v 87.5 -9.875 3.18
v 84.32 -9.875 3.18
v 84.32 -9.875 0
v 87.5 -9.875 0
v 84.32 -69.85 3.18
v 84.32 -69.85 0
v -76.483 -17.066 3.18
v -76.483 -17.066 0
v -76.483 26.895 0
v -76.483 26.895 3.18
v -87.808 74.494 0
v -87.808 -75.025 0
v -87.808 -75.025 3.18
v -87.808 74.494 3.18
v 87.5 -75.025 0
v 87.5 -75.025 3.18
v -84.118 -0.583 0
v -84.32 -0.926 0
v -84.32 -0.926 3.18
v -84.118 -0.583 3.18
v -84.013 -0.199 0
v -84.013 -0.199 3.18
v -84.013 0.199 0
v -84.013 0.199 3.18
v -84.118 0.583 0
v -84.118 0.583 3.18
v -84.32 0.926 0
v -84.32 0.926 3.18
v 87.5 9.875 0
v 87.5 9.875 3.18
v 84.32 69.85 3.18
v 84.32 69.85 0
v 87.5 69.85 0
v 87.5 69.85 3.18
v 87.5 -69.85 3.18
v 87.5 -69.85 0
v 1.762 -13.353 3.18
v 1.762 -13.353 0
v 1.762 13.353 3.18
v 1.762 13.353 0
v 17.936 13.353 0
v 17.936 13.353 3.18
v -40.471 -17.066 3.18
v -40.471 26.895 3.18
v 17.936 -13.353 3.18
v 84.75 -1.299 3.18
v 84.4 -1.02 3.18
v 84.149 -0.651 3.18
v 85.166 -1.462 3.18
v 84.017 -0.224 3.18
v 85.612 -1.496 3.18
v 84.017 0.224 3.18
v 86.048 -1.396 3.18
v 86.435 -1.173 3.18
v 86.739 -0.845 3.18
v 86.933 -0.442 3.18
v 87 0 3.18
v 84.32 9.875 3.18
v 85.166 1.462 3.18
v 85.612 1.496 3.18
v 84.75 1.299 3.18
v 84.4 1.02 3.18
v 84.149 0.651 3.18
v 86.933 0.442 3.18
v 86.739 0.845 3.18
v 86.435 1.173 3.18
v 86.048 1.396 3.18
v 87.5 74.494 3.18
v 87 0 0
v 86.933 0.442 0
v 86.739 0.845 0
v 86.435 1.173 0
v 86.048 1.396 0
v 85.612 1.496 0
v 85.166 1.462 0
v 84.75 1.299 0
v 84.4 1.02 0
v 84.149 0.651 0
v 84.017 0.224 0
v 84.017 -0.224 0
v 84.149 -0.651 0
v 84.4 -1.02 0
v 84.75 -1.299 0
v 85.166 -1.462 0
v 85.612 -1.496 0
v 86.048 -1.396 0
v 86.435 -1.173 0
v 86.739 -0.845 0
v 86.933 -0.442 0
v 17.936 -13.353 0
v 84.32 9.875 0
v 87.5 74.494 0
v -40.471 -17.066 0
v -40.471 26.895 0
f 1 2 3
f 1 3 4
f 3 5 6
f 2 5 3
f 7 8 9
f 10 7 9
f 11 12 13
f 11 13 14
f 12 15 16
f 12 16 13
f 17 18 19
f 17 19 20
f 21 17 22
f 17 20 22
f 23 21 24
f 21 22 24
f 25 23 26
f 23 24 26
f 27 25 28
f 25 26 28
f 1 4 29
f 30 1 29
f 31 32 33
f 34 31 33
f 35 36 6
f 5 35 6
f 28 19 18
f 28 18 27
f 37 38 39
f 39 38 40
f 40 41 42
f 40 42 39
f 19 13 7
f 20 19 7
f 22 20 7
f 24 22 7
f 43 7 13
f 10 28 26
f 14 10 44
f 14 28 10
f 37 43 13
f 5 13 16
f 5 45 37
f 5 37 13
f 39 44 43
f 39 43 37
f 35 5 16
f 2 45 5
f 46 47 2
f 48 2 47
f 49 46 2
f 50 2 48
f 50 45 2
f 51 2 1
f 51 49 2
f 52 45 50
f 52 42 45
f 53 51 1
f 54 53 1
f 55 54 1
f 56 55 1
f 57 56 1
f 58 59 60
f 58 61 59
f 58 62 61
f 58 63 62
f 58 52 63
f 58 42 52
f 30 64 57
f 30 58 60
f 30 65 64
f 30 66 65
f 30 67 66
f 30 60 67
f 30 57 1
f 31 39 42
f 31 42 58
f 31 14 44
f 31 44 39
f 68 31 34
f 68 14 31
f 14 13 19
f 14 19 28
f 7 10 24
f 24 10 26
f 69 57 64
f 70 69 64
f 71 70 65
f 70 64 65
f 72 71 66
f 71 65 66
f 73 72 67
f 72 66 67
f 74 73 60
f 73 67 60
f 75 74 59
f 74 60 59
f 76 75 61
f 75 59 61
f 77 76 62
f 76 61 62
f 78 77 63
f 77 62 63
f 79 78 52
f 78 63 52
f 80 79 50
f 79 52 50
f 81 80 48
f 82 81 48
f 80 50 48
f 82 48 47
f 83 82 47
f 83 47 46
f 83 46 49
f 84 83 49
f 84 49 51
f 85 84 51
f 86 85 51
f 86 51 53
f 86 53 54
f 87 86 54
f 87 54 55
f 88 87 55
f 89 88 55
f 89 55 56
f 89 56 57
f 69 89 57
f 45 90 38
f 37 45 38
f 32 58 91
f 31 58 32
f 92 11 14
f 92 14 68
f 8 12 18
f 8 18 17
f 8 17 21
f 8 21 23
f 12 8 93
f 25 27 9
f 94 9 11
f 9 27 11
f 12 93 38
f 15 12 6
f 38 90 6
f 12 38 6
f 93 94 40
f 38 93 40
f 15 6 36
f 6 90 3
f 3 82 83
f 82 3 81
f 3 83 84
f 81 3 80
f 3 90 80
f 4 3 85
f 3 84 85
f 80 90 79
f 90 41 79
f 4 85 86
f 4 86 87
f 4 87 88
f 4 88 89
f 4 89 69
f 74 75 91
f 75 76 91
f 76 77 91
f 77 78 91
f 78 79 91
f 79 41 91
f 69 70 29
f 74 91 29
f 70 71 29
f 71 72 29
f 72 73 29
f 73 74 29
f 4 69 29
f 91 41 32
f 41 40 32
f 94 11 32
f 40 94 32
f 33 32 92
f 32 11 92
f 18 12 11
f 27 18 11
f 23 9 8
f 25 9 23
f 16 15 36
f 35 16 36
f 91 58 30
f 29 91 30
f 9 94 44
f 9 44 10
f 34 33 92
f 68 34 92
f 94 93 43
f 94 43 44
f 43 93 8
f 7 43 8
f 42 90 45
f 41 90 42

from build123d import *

# Parameters (mm, degrees)
SKETCH1_W           = 175
SKETCH1_H           = 139.7
BOSS_EXTRUDE1_DEPTH = 3.18
SKETCH2_R           = 1.5
SKETCH2_W           = 3.18
SKETCH2_H           = 59.975
CUT_EXTRUDE1_DEPTH  = 4.18
SKETCH3_R           = 1.59
CUT_EXTRUDE2_DEPTH  = 4.18
SKETCH4_R           = 1.59
CUT_EXTRUDE3_DEPTH  = 4.18
SKETCH5_W           = 91.926224914
SKETCH5_H           = 123.656630911
BOSS_EXTRUDE2_DEPTH = 3.18
SKETCH6_W           = 3.18
SKETCH6_H           = 19.75
CUT_EXTRUDE4_DEPTH  = 4.18
SKETCH8_W           = 25.560381265
SKETCH8_H           = 19.67928192
BOSS_EXTRUDE3_DEPTH = 3.18
SKETCH10_W          = 20
SKETCH10_H          = 2.468001363
BOSS_EXTRUDE4_DEPTH = 3.18
CUT_EXTRUDE5_DEPTH  = 4.18
SKETCH12_W          = 36.012104279
SKETCH12_H          = 43.960205632
CUT_EXTRUDE6_DEPTH  = 4.18
SKETCH13_W          = 16.174082381
SKETCH13_H          = 26.705141904
CUT_EXTRUDE7_DEPTH  = 4.18
SKETCH16_W          = 18.884338216
SKETCH16_H          = 121.056150973
SKETCH16_W_2        = 10.857087527
SKETCH16_H_2        = 35.437593219
SKETCH16_W_3        = 28.428801023
SKETCH16_H_3        = 14.001351757
SKETCH16_W_4        = 22.576937907
SKETCH16_H_4        = 16.729537969
BOSS_EXTRUDE6_DEPTH = 3.18
BOSS_EXTRUDE7_DEPTH = 3.18


with BuildPart() as part:
    # Sketch1 → Boss-Extrude1 (new body)
    with BuildSketch(Plane.XY):
        Rectangle(SKETCH1_W, SKETCH1_H)
    extrude(amount=BOSS_EXTRUDE1_DEPTH)

    # Sketch2 → Cut-Extrude1 (cut, through all)
    with BuildSketch(Plane.XY.offset(3.18)):
        with Locations((-85.5, 0)):
            Circle(SKETCH2_R)
        with Locations((85.5, 0)):
            Circle(SKETCH2_R)
        Polygon((-10, 69.85), (10, 69.85), (10, 66.67), (1.5, 66.67), (1.5, 62.67), (3.5, 62.67), (3.5, 59.67), (1.5, 59.67), (1.5, 56.67), (-1.5, 56.67), (-1.5, 59.67), (-3.5, 59.67), (-3.5, 62.67), (-1.5, 62.67), (-1.5, 66.67), (-10, 66.67), align=None)
        Polygon((-10, -69.85), (-10, -66.67), (-1.5, -66.67), (-1.5, -62.67), (-3.5, -62.67), (-3.5, -59.67), (-1.5, -59.67), (-1.5, -56.67), (1.5, -56.67), (1.5, -59.67), (3.5, -59.67), (3.5, -62.67), (1.5, -62.67), (1.5, -66.67), (10, -66.67), (10, -69.85), align=None)
        with Locations((-85.91, 39.8625)):
            Rectangle(SKETCH2_W, SKETCH2_H)
        with Locations((-85.91, -39.8625)):
            Rectangle(SKETCH2_W, SKETCH2_H)
        with Locations((85.91, -39.8625)):
            Rectangle(SKETCH2_W, SKETCH2_H)
        with Locations((85.91, 39.8625)):
            Rectangle(SKETCH2_W, SKETCH2_H)
        Polygon((-28.854904074, -66.67), (-20.334061159, -66.67), (-20.334061159, -69.85), (-40.334061159, -69.85), (-40.334061159, -66.67), (-31.854904074, -66.67), (-31.854904074, -62.67), (-33.77295002, -62.67), (-33.77295002, -59.67), (-31.854904074, -59.67), (-31.854904074, -56.85), (-28.854904074, -56.85), (-28.854904074, -59.67), (-26.77295002, -59.67), (-26.77295002, -62.67), (-28.854904074, -62.67), align=None)
    extrude(amount=-CUT_EXTRUDE1_DEPTH, mode=Mode.SUBTRACT)

    # Sketch3 → Cut-Extrude2 (cut, through all)
    with BuildSketch(Plane(origin=(0, 0, 0), x_dir=(-1, 0, 0), z_dir=(0, 0, -1))):
        with Locations((-35.67127699, -47.963396943)):
            Circle(SKETCH3_R)
        with Locations((-35.67127699, -30.777287406)):
            Circle(SKETCH3_R)
    extrude(amount=-CUT_EXTRUDE2_DEPTH, mode=Mode.SUBTRACT)

    # Sketch4 → Cut-Extrude3 (cut, through all)
    with BuildSketch(Plane(origin=(0, 0, 0), x_dir=(-1, 0, 0), z_dir=(0, 0, -1))):
        with Locations((-34.750723073, 53.780323187)):
            Circle(SKETCH4_R)
        with Locations((-34.750723073, 36.59421365)):
            Circle(SKETCH4_R)
        with Locations((36.249784221, 53.780323187)):
            Circle(SKETCH4_R)
        with Locations((36.249784221, 36.59421365)):
            Circle(SKETCH4_R)
        with Locations((35.983928162, -30.777287406)):
            Circle(SKETCH4_R)
        with Locations((35.983928162, -47.963396943)):
            Circle(SKETCH4_R)
        with Locations((-35.67127699, -30.777287406)):
            Circle(SKETCH4_R)
        with Locations((-35.67127699, -47.963396943)):
            Circle(SKETCH4_R)
    extrude(amount=-CUT_EXTRUDE3_DEPTH, mode=Mode.SUBTRACT)

    # Sketch5 → Boss-Extrude2 (add)
    with BuildSketch(Plane.XY.offset(3.18)):
        with Locations((-0.563564665, 5.553683182)):
            Rectangle(SKETCH5_W, SKETCH5_H)
    extrude(amount=-BOSS_EXTRUDE2_DEPTH)

    # Sketch6 → Cut-Extrude4 (cut, through all)
    with BuildSketch(Plane(origin=(0, 0, 0), x_dir=(-1, 0, 0), z_dir=(0, 0, -1))):
        with Locations((-25.21, 0.03599429)):
            Rectangle(SKETCH6_W, SKETCH6_H)
        with Locations((13.073612417, 0)):
            Rectangle(SKETCH6_W, SKETCH6_H)
    extrude(amount=-CUT_EXTRUDE4_DEPTH, mode=Mode.SUBTRACT)

    # Sketch8 → Boss-Extrude3 (add)
    with BuildSketch(Plane(origin=(0, 0, 0), x_dir=(-1, 0, 0), z_dir=(0, 0, -1))):
        with Locations((-2.780190633, -60.01035904)):
            Rectangle(SKETCH8_W, SKETCH8_H)
    extrude(amount=-BOSS_EXTRUDE3_DEPTH)

    # Sketch10 → Boss-Extrude4 (add)
    with BuildSketch(Plane(origin=(0, 0, 0), x_dir=(-1, 0, 0), z_dir=(0, 0, -1))):
        with Locations((0, 68.615999319)):
            Rectangle(SKETCH10_W, SKETCH10_H)
    extrude(amount=-BOSS_EXTRUDE4_DEPTH)

    # Sketch11 → Cut-Extrude5 (cut, through all)
    with BuildSketch(Plane(origin=(0, 0, 0), x_dir=(-1, 0, 0), z_dir=(0, 0, -1))):
        Polygon((20.793148035, 66.67), (29.479057969, 66.67), (29.479057969, 62.67), (27.293148035, 62.67), (27.293148035, 59.67), (29.479057969, 59.67), (29.479057969, 56.85), (32.479057969, 56.85), (32.479057969, 59.67), (34.293148035, 59.67), (34.293148035, 62.67), (32.479057969, 62.67), (32.479057969, 66.67), (40.793148035, 66.67), (40.793148035, 69.85), (20.793148035, 69.85), align=None)
    extrude(amount=-CUT_EXTRUDE5_DEPTH, mode=Mode.SUBTRACT)

    # Sketch12 → Cut-Extrude6 (cut, through all)
    with BuildSketch(Plane(origin=(0, 0, 0), x_dir=(-1, 0, 0), z_dir=(0, 0, -1))):
        with Locations((58.477018613, 4.914539536)):
            Rectangle(SKETCH12_W, SKETCH12_H)
    extrude(amount=-CUT_EXTRUDE6_DEPTH, mode=Mode.SUBTRACT)

    # Sketch13 → Cut-Extrude7 (cut, through all)
    with BuildSketch(Plane(origin=(0, 0, 0), x_dir=(-1, 0, 0), z_dir=(0, 0, -1))):
        with Locations((-9.848843291, 0)):
            Rectangle(SKETCH13_W, SKETCH13_H)
    extrude(amount=-CUT_EXTRUDE7_DEPTH, mode=Mode.SUBTRACT)

    # Sketch16 → Boss-Extrude6 (add)
    with BuildSketch(Plane(origin=(0, 0, 0), x_dir=(-1, 0, 0), z_dir=(0, 0, -1))):
        with Locations((-31.859595144, -9.321924514)):
            Rectangle(SKETCH16_W, SKETCH16_H)
        with Locations((12.113243242, -1.915189585)):
            Rectangle(SKETCH16_W_2, SKETCH16_H_2)
        with Locations((31.756187516, -62.849324122)):
            Rectangle(SKETCH16_W_3, SKETCH16_H_3)
        with Locations((32.081616989, 61.485231016)):
            Rectangle(SKETCH16_W_4, SKETCH16_H_4)
    extrude(amount=-BOSS_EXTRUDE6_DEPTH)

    # Sketch17 → Boss-Extrude7 (add)
    with BuildSketch(Plane(origin=(0, 0, 0), x_dir=(-1, 0, 0), z_dir=(0, 0, -1))):
        Polygon((-87.5, -69.85), (84.32, -69.85), (84.32, 69.85), (-87.5, 69.85), (-87.5, 74.493800826), (84.32, 74.493800826), (87.808220565, 74.493800826), (87.808220565, -69.85), (87.808220565, -75.025003811), (84.32, -75.025003811), (-87.5, -75.025003811), align=None)
    extrude(amount=-BOSS_EXTRUDE7_DEPTH)


solid = part.part
